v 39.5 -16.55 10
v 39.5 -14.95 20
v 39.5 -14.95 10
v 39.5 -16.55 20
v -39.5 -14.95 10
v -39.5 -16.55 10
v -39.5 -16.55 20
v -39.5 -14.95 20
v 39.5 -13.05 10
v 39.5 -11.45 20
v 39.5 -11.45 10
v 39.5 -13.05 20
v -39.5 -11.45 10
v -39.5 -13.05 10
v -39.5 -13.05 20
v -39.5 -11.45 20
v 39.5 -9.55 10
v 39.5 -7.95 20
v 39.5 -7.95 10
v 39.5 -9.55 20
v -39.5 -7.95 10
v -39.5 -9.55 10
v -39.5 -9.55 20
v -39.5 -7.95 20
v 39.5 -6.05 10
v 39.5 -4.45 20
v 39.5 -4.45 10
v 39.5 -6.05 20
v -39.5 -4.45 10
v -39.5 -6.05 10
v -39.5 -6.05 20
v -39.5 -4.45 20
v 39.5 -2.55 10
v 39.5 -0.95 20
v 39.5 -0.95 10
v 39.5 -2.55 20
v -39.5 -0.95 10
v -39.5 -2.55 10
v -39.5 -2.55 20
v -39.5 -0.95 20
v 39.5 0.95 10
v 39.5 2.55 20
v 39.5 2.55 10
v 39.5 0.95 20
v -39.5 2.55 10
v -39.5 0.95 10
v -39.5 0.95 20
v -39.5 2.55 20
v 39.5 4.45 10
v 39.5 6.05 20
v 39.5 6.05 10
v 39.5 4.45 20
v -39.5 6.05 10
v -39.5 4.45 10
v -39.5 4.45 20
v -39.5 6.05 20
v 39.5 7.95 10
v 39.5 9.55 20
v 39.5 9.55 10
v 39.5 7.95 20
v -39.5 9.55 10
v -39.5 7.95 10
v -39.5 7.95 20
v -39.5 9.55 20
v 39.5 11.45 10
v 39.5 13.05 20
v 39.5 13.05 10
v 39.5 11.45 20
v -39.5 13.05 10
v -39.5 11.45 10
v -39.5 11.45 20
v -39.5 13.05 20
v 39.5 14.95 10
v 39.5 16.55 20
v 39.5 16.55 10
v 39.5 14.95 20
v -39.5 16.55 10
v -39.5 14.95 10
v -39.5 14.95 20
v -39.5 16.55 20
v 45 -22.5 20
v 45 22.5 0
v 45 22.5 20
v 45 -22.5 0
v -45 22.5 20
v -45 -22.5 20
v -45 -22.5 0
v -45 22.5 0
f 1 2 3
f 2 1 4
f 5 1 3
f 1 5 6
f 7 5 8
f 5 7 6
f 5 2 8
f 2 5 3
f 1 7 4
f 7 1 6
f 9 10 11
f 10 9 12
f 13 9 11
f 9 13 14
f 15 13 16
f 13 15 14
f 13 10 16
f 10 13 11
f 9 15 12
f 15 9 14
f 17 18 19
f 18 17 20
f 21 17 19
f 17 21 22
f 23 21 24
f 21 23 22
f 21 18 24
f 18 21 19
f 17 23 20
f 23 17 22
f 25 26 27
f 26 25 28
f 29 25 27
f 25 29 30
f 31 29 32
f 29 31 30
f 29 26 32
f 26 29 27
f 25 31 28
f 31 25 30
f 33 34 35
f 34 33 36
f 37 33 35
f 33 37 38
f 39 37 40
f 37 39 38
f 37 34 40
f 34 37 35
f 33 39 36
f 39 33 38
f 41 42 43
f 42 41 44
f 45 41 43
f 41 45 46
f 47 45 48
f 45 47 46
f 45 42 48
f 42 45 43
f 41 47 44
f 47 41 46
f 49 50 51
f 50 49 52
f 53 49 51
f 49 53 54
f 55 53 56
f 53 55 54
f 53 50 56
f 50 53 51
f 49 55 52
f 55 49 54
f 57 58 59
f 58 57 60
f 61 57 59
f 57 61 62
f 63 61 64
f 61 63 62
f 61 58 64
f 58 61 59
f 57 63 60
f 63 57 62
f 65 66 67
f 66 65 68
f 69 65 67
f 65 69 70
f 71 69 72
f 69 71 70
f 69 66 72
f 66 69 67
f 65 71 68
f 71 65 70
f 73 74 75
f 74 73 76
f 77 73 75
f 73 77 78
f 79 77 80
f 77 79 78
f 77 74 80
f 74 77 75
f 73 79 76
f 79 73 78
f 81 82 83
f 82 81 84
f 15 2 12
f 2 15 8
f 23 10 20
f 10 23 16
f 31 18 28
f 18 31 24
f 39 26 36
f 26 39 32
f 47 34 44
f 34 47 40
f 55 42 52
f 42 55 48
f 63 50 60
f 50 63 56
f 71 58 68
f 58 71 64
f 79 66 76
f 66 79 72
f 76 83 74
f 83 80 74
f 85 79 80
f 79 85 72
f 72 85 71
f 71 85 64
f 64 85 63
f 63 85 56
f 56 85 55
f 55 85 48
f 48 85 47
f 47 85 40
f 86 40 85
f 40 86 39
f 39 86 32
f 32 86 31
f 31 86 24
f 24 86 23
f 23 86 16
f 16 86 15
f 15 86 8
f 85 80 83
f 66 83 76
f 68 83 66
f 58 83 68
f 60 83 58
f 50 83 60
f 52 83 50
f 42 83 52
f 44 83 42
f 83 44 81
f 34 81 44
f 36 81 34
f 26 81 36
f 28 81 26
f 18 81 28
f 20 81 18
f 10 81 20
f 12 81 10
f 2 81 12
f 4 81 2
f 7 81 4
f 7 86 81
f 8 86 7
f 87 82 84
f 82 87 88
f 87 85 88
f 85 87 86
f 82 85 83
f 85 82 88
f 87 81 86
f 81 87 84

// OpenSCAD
// Microscope Slide Drying Rack
// Designed for 10 slides (75x25x1mm) standing upright on long edge.

// Block Dimensions
L = 90;             // Length (X)
W = 45;             // Width (Y)
H = 20;             // Height (Z)

// Slot Dimensions
slot_L = 77;        // Slot length (X)
slot_W = 1.6;       // Slot width (Y)
slot_D = 10;        // Slot depth (Z)
num_slots = 10;     // Number of slots
pitch = 3.5;        // Center-to-center spacing (Y)

$fn = 64;

// Calculate the starting Y position to center the group of slots
// The total width occupied by centers is (num_slots - 1) * pitch
y_offset = ((num_slots - 1) * pitch) / 2;

difference() {
    // The main solid base block
    // Centered on X and Y, sitting on Z=0
    translate([-L/2, -W/2, 0]) {
        cube([L, W, H]);
    }

    // The slots
    for (i = [0 : num_slots - 1]) {
        // Calculate Y center for this specific slot
        slot_y_pos = (i * pitch) - y_offset;
        
        // To ensure a clean cut without coplanar faces, 
        // we extend the slot slightly beyond the block boundaries.
        // The slot is 77mm long, so we translate to -38.5 and make it 79.
        // The slot is 10mm deep, so we start at H-10 and go to H+1.
        translate([-slot_L/2 - 1, slot_y_pos - slot_W/2, H - slot_D]) {
            cube([slot_L + 2, slot_W, slot_D + 1]);
        }
    }
}
